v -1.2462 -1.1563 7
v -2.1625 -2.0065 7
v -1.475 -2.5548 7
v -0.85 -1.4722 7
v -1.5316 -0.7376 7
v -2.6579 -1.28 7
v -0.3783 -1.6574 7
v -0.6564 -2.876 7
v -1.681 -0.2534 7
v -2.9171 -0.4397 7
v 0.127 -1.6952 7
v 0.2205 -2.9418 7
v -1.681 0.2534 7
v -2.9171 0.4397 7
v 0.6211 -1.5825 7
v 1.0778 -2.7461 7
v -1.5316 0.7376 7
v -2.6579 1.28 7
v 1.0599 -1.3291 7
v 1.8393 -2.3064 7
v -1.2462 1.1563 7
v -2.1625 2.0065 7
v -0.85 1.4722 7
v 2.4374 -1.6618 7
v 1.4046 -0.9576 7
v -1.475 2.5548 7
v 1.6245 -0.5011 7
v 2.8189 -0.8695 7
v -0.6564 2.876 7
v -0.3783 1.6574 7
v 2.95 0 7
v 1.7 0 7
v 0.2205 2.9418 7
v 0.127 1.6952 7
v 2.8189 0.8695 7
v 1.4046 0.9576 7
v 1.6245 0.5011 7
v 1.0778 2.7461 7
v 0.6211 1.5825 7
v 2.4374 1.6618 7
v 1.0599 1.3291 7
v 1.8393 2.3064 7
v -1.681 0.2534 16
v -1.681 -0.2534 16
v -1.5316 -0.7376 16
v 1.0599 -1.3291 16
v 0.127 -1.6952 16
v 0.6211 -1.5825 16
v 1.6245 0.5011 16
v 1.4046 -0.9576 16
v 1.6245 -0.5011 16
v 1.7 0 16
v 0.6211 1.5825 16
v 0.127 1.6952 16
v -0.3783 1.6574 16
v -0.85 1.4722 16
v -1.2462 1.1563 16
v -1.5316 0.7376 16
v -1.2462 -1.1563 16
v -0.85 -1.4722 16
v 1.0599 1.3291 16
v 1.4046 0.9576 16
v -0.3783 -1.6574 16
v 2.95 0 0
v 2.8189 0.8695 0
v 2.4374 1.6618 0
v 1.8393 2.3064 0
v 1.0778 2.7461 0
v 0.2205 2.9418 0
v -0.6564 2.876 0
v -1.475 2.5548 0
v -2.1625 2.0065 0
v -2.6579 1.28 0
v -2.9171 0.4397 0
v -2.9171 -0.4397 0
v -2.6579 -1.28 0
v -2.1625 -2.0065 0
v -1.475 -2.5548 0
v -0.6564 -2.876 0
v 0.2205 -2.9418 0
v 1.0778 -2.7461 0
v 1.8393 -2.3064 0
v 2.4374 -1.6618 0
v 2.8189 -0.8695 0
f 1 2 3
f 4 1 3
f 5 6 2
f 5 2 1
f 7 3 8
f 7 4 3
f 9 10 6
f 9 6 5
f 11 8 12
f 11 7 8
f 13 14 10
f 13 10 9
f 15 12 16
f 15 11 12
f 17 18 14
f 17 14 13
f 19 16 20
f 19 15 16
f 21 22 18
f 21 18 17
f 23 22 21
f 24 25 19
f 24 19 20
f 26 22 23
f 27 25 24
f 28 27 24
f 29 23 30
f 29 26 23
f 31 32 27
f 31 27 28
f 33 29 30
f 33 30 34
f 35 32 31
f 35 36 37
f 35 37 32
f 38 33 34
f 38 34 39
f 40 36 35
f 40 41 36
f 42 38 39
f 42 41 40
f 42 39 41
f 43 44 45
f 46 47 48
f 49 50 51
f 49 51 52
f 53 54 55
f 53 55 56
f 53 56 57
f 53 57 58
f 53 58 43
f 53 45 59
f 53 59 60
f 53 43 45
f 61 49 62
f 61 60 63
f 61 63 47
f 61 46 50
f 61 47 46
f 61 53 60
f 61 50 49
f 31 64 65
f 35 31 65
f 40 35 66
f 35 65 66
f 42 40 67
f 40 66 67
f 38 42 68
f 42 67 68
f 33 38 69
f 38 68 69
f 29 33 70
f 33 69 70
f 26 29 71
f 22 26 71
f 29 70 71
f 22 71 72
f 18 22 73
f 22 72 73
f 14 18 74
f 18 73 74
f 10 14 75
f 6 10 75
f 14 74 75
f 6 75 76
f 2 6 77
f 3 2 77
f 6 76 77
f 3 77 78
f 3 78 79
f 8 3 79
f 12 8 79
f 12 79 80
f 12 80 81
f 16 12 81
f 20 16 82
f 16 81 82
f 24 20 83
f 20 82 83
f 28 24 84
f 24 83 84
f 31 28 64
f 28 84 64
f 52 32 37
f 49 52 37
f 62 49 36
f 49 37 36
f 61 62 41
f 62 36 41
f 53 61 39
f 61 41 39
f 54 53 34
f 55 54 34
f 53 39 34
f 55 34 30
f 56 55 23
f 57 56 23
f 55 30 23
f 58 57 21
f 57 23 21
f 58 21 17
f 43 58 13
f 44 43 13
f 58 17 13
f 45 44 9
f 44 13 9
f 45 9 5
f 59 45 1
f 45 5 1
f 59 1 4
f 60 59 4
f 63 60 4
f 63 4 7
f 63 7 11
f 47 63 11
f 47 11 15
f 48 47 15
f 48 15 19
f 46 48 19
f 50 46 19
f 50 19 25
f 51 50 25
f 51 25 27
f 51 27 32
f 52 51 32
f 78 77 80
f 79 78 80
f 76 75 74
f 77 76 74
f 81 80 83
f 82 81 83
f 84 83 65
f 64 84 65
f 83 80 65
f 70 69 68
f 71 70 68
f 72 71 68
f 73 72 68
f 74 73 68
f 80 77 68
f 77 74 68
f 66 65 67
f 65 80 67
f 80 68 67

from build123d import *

# Parameters (mm, degrees)
CYLINDER_R        = 2.95
CYLINDER_DEPTH    = 7
CYLINDER001_R     = 1.7
CYLINDER001_DEPTH = 10


with BuildPart() as m3bolthead:
    # Cylinder → Cylinder (new body)
    with BuildSketch(Plane.XY):
        Circle(CYLINDER_R)
    extrude(amount=CYLINDER_DEPTH)


with BuildPart() as m3bolt:
    # Cylinder001 → Cylinder001 (new body)
    with BuildSketch(Plane.XY.offset(6)):
        Circle(CYLINDER001_R)
    extrude(amount=CYLINDER001_DEPTH)

    # Fusion: union M3BoltHead
    add(m3bolthead.part)


solid = m3bolt.part
